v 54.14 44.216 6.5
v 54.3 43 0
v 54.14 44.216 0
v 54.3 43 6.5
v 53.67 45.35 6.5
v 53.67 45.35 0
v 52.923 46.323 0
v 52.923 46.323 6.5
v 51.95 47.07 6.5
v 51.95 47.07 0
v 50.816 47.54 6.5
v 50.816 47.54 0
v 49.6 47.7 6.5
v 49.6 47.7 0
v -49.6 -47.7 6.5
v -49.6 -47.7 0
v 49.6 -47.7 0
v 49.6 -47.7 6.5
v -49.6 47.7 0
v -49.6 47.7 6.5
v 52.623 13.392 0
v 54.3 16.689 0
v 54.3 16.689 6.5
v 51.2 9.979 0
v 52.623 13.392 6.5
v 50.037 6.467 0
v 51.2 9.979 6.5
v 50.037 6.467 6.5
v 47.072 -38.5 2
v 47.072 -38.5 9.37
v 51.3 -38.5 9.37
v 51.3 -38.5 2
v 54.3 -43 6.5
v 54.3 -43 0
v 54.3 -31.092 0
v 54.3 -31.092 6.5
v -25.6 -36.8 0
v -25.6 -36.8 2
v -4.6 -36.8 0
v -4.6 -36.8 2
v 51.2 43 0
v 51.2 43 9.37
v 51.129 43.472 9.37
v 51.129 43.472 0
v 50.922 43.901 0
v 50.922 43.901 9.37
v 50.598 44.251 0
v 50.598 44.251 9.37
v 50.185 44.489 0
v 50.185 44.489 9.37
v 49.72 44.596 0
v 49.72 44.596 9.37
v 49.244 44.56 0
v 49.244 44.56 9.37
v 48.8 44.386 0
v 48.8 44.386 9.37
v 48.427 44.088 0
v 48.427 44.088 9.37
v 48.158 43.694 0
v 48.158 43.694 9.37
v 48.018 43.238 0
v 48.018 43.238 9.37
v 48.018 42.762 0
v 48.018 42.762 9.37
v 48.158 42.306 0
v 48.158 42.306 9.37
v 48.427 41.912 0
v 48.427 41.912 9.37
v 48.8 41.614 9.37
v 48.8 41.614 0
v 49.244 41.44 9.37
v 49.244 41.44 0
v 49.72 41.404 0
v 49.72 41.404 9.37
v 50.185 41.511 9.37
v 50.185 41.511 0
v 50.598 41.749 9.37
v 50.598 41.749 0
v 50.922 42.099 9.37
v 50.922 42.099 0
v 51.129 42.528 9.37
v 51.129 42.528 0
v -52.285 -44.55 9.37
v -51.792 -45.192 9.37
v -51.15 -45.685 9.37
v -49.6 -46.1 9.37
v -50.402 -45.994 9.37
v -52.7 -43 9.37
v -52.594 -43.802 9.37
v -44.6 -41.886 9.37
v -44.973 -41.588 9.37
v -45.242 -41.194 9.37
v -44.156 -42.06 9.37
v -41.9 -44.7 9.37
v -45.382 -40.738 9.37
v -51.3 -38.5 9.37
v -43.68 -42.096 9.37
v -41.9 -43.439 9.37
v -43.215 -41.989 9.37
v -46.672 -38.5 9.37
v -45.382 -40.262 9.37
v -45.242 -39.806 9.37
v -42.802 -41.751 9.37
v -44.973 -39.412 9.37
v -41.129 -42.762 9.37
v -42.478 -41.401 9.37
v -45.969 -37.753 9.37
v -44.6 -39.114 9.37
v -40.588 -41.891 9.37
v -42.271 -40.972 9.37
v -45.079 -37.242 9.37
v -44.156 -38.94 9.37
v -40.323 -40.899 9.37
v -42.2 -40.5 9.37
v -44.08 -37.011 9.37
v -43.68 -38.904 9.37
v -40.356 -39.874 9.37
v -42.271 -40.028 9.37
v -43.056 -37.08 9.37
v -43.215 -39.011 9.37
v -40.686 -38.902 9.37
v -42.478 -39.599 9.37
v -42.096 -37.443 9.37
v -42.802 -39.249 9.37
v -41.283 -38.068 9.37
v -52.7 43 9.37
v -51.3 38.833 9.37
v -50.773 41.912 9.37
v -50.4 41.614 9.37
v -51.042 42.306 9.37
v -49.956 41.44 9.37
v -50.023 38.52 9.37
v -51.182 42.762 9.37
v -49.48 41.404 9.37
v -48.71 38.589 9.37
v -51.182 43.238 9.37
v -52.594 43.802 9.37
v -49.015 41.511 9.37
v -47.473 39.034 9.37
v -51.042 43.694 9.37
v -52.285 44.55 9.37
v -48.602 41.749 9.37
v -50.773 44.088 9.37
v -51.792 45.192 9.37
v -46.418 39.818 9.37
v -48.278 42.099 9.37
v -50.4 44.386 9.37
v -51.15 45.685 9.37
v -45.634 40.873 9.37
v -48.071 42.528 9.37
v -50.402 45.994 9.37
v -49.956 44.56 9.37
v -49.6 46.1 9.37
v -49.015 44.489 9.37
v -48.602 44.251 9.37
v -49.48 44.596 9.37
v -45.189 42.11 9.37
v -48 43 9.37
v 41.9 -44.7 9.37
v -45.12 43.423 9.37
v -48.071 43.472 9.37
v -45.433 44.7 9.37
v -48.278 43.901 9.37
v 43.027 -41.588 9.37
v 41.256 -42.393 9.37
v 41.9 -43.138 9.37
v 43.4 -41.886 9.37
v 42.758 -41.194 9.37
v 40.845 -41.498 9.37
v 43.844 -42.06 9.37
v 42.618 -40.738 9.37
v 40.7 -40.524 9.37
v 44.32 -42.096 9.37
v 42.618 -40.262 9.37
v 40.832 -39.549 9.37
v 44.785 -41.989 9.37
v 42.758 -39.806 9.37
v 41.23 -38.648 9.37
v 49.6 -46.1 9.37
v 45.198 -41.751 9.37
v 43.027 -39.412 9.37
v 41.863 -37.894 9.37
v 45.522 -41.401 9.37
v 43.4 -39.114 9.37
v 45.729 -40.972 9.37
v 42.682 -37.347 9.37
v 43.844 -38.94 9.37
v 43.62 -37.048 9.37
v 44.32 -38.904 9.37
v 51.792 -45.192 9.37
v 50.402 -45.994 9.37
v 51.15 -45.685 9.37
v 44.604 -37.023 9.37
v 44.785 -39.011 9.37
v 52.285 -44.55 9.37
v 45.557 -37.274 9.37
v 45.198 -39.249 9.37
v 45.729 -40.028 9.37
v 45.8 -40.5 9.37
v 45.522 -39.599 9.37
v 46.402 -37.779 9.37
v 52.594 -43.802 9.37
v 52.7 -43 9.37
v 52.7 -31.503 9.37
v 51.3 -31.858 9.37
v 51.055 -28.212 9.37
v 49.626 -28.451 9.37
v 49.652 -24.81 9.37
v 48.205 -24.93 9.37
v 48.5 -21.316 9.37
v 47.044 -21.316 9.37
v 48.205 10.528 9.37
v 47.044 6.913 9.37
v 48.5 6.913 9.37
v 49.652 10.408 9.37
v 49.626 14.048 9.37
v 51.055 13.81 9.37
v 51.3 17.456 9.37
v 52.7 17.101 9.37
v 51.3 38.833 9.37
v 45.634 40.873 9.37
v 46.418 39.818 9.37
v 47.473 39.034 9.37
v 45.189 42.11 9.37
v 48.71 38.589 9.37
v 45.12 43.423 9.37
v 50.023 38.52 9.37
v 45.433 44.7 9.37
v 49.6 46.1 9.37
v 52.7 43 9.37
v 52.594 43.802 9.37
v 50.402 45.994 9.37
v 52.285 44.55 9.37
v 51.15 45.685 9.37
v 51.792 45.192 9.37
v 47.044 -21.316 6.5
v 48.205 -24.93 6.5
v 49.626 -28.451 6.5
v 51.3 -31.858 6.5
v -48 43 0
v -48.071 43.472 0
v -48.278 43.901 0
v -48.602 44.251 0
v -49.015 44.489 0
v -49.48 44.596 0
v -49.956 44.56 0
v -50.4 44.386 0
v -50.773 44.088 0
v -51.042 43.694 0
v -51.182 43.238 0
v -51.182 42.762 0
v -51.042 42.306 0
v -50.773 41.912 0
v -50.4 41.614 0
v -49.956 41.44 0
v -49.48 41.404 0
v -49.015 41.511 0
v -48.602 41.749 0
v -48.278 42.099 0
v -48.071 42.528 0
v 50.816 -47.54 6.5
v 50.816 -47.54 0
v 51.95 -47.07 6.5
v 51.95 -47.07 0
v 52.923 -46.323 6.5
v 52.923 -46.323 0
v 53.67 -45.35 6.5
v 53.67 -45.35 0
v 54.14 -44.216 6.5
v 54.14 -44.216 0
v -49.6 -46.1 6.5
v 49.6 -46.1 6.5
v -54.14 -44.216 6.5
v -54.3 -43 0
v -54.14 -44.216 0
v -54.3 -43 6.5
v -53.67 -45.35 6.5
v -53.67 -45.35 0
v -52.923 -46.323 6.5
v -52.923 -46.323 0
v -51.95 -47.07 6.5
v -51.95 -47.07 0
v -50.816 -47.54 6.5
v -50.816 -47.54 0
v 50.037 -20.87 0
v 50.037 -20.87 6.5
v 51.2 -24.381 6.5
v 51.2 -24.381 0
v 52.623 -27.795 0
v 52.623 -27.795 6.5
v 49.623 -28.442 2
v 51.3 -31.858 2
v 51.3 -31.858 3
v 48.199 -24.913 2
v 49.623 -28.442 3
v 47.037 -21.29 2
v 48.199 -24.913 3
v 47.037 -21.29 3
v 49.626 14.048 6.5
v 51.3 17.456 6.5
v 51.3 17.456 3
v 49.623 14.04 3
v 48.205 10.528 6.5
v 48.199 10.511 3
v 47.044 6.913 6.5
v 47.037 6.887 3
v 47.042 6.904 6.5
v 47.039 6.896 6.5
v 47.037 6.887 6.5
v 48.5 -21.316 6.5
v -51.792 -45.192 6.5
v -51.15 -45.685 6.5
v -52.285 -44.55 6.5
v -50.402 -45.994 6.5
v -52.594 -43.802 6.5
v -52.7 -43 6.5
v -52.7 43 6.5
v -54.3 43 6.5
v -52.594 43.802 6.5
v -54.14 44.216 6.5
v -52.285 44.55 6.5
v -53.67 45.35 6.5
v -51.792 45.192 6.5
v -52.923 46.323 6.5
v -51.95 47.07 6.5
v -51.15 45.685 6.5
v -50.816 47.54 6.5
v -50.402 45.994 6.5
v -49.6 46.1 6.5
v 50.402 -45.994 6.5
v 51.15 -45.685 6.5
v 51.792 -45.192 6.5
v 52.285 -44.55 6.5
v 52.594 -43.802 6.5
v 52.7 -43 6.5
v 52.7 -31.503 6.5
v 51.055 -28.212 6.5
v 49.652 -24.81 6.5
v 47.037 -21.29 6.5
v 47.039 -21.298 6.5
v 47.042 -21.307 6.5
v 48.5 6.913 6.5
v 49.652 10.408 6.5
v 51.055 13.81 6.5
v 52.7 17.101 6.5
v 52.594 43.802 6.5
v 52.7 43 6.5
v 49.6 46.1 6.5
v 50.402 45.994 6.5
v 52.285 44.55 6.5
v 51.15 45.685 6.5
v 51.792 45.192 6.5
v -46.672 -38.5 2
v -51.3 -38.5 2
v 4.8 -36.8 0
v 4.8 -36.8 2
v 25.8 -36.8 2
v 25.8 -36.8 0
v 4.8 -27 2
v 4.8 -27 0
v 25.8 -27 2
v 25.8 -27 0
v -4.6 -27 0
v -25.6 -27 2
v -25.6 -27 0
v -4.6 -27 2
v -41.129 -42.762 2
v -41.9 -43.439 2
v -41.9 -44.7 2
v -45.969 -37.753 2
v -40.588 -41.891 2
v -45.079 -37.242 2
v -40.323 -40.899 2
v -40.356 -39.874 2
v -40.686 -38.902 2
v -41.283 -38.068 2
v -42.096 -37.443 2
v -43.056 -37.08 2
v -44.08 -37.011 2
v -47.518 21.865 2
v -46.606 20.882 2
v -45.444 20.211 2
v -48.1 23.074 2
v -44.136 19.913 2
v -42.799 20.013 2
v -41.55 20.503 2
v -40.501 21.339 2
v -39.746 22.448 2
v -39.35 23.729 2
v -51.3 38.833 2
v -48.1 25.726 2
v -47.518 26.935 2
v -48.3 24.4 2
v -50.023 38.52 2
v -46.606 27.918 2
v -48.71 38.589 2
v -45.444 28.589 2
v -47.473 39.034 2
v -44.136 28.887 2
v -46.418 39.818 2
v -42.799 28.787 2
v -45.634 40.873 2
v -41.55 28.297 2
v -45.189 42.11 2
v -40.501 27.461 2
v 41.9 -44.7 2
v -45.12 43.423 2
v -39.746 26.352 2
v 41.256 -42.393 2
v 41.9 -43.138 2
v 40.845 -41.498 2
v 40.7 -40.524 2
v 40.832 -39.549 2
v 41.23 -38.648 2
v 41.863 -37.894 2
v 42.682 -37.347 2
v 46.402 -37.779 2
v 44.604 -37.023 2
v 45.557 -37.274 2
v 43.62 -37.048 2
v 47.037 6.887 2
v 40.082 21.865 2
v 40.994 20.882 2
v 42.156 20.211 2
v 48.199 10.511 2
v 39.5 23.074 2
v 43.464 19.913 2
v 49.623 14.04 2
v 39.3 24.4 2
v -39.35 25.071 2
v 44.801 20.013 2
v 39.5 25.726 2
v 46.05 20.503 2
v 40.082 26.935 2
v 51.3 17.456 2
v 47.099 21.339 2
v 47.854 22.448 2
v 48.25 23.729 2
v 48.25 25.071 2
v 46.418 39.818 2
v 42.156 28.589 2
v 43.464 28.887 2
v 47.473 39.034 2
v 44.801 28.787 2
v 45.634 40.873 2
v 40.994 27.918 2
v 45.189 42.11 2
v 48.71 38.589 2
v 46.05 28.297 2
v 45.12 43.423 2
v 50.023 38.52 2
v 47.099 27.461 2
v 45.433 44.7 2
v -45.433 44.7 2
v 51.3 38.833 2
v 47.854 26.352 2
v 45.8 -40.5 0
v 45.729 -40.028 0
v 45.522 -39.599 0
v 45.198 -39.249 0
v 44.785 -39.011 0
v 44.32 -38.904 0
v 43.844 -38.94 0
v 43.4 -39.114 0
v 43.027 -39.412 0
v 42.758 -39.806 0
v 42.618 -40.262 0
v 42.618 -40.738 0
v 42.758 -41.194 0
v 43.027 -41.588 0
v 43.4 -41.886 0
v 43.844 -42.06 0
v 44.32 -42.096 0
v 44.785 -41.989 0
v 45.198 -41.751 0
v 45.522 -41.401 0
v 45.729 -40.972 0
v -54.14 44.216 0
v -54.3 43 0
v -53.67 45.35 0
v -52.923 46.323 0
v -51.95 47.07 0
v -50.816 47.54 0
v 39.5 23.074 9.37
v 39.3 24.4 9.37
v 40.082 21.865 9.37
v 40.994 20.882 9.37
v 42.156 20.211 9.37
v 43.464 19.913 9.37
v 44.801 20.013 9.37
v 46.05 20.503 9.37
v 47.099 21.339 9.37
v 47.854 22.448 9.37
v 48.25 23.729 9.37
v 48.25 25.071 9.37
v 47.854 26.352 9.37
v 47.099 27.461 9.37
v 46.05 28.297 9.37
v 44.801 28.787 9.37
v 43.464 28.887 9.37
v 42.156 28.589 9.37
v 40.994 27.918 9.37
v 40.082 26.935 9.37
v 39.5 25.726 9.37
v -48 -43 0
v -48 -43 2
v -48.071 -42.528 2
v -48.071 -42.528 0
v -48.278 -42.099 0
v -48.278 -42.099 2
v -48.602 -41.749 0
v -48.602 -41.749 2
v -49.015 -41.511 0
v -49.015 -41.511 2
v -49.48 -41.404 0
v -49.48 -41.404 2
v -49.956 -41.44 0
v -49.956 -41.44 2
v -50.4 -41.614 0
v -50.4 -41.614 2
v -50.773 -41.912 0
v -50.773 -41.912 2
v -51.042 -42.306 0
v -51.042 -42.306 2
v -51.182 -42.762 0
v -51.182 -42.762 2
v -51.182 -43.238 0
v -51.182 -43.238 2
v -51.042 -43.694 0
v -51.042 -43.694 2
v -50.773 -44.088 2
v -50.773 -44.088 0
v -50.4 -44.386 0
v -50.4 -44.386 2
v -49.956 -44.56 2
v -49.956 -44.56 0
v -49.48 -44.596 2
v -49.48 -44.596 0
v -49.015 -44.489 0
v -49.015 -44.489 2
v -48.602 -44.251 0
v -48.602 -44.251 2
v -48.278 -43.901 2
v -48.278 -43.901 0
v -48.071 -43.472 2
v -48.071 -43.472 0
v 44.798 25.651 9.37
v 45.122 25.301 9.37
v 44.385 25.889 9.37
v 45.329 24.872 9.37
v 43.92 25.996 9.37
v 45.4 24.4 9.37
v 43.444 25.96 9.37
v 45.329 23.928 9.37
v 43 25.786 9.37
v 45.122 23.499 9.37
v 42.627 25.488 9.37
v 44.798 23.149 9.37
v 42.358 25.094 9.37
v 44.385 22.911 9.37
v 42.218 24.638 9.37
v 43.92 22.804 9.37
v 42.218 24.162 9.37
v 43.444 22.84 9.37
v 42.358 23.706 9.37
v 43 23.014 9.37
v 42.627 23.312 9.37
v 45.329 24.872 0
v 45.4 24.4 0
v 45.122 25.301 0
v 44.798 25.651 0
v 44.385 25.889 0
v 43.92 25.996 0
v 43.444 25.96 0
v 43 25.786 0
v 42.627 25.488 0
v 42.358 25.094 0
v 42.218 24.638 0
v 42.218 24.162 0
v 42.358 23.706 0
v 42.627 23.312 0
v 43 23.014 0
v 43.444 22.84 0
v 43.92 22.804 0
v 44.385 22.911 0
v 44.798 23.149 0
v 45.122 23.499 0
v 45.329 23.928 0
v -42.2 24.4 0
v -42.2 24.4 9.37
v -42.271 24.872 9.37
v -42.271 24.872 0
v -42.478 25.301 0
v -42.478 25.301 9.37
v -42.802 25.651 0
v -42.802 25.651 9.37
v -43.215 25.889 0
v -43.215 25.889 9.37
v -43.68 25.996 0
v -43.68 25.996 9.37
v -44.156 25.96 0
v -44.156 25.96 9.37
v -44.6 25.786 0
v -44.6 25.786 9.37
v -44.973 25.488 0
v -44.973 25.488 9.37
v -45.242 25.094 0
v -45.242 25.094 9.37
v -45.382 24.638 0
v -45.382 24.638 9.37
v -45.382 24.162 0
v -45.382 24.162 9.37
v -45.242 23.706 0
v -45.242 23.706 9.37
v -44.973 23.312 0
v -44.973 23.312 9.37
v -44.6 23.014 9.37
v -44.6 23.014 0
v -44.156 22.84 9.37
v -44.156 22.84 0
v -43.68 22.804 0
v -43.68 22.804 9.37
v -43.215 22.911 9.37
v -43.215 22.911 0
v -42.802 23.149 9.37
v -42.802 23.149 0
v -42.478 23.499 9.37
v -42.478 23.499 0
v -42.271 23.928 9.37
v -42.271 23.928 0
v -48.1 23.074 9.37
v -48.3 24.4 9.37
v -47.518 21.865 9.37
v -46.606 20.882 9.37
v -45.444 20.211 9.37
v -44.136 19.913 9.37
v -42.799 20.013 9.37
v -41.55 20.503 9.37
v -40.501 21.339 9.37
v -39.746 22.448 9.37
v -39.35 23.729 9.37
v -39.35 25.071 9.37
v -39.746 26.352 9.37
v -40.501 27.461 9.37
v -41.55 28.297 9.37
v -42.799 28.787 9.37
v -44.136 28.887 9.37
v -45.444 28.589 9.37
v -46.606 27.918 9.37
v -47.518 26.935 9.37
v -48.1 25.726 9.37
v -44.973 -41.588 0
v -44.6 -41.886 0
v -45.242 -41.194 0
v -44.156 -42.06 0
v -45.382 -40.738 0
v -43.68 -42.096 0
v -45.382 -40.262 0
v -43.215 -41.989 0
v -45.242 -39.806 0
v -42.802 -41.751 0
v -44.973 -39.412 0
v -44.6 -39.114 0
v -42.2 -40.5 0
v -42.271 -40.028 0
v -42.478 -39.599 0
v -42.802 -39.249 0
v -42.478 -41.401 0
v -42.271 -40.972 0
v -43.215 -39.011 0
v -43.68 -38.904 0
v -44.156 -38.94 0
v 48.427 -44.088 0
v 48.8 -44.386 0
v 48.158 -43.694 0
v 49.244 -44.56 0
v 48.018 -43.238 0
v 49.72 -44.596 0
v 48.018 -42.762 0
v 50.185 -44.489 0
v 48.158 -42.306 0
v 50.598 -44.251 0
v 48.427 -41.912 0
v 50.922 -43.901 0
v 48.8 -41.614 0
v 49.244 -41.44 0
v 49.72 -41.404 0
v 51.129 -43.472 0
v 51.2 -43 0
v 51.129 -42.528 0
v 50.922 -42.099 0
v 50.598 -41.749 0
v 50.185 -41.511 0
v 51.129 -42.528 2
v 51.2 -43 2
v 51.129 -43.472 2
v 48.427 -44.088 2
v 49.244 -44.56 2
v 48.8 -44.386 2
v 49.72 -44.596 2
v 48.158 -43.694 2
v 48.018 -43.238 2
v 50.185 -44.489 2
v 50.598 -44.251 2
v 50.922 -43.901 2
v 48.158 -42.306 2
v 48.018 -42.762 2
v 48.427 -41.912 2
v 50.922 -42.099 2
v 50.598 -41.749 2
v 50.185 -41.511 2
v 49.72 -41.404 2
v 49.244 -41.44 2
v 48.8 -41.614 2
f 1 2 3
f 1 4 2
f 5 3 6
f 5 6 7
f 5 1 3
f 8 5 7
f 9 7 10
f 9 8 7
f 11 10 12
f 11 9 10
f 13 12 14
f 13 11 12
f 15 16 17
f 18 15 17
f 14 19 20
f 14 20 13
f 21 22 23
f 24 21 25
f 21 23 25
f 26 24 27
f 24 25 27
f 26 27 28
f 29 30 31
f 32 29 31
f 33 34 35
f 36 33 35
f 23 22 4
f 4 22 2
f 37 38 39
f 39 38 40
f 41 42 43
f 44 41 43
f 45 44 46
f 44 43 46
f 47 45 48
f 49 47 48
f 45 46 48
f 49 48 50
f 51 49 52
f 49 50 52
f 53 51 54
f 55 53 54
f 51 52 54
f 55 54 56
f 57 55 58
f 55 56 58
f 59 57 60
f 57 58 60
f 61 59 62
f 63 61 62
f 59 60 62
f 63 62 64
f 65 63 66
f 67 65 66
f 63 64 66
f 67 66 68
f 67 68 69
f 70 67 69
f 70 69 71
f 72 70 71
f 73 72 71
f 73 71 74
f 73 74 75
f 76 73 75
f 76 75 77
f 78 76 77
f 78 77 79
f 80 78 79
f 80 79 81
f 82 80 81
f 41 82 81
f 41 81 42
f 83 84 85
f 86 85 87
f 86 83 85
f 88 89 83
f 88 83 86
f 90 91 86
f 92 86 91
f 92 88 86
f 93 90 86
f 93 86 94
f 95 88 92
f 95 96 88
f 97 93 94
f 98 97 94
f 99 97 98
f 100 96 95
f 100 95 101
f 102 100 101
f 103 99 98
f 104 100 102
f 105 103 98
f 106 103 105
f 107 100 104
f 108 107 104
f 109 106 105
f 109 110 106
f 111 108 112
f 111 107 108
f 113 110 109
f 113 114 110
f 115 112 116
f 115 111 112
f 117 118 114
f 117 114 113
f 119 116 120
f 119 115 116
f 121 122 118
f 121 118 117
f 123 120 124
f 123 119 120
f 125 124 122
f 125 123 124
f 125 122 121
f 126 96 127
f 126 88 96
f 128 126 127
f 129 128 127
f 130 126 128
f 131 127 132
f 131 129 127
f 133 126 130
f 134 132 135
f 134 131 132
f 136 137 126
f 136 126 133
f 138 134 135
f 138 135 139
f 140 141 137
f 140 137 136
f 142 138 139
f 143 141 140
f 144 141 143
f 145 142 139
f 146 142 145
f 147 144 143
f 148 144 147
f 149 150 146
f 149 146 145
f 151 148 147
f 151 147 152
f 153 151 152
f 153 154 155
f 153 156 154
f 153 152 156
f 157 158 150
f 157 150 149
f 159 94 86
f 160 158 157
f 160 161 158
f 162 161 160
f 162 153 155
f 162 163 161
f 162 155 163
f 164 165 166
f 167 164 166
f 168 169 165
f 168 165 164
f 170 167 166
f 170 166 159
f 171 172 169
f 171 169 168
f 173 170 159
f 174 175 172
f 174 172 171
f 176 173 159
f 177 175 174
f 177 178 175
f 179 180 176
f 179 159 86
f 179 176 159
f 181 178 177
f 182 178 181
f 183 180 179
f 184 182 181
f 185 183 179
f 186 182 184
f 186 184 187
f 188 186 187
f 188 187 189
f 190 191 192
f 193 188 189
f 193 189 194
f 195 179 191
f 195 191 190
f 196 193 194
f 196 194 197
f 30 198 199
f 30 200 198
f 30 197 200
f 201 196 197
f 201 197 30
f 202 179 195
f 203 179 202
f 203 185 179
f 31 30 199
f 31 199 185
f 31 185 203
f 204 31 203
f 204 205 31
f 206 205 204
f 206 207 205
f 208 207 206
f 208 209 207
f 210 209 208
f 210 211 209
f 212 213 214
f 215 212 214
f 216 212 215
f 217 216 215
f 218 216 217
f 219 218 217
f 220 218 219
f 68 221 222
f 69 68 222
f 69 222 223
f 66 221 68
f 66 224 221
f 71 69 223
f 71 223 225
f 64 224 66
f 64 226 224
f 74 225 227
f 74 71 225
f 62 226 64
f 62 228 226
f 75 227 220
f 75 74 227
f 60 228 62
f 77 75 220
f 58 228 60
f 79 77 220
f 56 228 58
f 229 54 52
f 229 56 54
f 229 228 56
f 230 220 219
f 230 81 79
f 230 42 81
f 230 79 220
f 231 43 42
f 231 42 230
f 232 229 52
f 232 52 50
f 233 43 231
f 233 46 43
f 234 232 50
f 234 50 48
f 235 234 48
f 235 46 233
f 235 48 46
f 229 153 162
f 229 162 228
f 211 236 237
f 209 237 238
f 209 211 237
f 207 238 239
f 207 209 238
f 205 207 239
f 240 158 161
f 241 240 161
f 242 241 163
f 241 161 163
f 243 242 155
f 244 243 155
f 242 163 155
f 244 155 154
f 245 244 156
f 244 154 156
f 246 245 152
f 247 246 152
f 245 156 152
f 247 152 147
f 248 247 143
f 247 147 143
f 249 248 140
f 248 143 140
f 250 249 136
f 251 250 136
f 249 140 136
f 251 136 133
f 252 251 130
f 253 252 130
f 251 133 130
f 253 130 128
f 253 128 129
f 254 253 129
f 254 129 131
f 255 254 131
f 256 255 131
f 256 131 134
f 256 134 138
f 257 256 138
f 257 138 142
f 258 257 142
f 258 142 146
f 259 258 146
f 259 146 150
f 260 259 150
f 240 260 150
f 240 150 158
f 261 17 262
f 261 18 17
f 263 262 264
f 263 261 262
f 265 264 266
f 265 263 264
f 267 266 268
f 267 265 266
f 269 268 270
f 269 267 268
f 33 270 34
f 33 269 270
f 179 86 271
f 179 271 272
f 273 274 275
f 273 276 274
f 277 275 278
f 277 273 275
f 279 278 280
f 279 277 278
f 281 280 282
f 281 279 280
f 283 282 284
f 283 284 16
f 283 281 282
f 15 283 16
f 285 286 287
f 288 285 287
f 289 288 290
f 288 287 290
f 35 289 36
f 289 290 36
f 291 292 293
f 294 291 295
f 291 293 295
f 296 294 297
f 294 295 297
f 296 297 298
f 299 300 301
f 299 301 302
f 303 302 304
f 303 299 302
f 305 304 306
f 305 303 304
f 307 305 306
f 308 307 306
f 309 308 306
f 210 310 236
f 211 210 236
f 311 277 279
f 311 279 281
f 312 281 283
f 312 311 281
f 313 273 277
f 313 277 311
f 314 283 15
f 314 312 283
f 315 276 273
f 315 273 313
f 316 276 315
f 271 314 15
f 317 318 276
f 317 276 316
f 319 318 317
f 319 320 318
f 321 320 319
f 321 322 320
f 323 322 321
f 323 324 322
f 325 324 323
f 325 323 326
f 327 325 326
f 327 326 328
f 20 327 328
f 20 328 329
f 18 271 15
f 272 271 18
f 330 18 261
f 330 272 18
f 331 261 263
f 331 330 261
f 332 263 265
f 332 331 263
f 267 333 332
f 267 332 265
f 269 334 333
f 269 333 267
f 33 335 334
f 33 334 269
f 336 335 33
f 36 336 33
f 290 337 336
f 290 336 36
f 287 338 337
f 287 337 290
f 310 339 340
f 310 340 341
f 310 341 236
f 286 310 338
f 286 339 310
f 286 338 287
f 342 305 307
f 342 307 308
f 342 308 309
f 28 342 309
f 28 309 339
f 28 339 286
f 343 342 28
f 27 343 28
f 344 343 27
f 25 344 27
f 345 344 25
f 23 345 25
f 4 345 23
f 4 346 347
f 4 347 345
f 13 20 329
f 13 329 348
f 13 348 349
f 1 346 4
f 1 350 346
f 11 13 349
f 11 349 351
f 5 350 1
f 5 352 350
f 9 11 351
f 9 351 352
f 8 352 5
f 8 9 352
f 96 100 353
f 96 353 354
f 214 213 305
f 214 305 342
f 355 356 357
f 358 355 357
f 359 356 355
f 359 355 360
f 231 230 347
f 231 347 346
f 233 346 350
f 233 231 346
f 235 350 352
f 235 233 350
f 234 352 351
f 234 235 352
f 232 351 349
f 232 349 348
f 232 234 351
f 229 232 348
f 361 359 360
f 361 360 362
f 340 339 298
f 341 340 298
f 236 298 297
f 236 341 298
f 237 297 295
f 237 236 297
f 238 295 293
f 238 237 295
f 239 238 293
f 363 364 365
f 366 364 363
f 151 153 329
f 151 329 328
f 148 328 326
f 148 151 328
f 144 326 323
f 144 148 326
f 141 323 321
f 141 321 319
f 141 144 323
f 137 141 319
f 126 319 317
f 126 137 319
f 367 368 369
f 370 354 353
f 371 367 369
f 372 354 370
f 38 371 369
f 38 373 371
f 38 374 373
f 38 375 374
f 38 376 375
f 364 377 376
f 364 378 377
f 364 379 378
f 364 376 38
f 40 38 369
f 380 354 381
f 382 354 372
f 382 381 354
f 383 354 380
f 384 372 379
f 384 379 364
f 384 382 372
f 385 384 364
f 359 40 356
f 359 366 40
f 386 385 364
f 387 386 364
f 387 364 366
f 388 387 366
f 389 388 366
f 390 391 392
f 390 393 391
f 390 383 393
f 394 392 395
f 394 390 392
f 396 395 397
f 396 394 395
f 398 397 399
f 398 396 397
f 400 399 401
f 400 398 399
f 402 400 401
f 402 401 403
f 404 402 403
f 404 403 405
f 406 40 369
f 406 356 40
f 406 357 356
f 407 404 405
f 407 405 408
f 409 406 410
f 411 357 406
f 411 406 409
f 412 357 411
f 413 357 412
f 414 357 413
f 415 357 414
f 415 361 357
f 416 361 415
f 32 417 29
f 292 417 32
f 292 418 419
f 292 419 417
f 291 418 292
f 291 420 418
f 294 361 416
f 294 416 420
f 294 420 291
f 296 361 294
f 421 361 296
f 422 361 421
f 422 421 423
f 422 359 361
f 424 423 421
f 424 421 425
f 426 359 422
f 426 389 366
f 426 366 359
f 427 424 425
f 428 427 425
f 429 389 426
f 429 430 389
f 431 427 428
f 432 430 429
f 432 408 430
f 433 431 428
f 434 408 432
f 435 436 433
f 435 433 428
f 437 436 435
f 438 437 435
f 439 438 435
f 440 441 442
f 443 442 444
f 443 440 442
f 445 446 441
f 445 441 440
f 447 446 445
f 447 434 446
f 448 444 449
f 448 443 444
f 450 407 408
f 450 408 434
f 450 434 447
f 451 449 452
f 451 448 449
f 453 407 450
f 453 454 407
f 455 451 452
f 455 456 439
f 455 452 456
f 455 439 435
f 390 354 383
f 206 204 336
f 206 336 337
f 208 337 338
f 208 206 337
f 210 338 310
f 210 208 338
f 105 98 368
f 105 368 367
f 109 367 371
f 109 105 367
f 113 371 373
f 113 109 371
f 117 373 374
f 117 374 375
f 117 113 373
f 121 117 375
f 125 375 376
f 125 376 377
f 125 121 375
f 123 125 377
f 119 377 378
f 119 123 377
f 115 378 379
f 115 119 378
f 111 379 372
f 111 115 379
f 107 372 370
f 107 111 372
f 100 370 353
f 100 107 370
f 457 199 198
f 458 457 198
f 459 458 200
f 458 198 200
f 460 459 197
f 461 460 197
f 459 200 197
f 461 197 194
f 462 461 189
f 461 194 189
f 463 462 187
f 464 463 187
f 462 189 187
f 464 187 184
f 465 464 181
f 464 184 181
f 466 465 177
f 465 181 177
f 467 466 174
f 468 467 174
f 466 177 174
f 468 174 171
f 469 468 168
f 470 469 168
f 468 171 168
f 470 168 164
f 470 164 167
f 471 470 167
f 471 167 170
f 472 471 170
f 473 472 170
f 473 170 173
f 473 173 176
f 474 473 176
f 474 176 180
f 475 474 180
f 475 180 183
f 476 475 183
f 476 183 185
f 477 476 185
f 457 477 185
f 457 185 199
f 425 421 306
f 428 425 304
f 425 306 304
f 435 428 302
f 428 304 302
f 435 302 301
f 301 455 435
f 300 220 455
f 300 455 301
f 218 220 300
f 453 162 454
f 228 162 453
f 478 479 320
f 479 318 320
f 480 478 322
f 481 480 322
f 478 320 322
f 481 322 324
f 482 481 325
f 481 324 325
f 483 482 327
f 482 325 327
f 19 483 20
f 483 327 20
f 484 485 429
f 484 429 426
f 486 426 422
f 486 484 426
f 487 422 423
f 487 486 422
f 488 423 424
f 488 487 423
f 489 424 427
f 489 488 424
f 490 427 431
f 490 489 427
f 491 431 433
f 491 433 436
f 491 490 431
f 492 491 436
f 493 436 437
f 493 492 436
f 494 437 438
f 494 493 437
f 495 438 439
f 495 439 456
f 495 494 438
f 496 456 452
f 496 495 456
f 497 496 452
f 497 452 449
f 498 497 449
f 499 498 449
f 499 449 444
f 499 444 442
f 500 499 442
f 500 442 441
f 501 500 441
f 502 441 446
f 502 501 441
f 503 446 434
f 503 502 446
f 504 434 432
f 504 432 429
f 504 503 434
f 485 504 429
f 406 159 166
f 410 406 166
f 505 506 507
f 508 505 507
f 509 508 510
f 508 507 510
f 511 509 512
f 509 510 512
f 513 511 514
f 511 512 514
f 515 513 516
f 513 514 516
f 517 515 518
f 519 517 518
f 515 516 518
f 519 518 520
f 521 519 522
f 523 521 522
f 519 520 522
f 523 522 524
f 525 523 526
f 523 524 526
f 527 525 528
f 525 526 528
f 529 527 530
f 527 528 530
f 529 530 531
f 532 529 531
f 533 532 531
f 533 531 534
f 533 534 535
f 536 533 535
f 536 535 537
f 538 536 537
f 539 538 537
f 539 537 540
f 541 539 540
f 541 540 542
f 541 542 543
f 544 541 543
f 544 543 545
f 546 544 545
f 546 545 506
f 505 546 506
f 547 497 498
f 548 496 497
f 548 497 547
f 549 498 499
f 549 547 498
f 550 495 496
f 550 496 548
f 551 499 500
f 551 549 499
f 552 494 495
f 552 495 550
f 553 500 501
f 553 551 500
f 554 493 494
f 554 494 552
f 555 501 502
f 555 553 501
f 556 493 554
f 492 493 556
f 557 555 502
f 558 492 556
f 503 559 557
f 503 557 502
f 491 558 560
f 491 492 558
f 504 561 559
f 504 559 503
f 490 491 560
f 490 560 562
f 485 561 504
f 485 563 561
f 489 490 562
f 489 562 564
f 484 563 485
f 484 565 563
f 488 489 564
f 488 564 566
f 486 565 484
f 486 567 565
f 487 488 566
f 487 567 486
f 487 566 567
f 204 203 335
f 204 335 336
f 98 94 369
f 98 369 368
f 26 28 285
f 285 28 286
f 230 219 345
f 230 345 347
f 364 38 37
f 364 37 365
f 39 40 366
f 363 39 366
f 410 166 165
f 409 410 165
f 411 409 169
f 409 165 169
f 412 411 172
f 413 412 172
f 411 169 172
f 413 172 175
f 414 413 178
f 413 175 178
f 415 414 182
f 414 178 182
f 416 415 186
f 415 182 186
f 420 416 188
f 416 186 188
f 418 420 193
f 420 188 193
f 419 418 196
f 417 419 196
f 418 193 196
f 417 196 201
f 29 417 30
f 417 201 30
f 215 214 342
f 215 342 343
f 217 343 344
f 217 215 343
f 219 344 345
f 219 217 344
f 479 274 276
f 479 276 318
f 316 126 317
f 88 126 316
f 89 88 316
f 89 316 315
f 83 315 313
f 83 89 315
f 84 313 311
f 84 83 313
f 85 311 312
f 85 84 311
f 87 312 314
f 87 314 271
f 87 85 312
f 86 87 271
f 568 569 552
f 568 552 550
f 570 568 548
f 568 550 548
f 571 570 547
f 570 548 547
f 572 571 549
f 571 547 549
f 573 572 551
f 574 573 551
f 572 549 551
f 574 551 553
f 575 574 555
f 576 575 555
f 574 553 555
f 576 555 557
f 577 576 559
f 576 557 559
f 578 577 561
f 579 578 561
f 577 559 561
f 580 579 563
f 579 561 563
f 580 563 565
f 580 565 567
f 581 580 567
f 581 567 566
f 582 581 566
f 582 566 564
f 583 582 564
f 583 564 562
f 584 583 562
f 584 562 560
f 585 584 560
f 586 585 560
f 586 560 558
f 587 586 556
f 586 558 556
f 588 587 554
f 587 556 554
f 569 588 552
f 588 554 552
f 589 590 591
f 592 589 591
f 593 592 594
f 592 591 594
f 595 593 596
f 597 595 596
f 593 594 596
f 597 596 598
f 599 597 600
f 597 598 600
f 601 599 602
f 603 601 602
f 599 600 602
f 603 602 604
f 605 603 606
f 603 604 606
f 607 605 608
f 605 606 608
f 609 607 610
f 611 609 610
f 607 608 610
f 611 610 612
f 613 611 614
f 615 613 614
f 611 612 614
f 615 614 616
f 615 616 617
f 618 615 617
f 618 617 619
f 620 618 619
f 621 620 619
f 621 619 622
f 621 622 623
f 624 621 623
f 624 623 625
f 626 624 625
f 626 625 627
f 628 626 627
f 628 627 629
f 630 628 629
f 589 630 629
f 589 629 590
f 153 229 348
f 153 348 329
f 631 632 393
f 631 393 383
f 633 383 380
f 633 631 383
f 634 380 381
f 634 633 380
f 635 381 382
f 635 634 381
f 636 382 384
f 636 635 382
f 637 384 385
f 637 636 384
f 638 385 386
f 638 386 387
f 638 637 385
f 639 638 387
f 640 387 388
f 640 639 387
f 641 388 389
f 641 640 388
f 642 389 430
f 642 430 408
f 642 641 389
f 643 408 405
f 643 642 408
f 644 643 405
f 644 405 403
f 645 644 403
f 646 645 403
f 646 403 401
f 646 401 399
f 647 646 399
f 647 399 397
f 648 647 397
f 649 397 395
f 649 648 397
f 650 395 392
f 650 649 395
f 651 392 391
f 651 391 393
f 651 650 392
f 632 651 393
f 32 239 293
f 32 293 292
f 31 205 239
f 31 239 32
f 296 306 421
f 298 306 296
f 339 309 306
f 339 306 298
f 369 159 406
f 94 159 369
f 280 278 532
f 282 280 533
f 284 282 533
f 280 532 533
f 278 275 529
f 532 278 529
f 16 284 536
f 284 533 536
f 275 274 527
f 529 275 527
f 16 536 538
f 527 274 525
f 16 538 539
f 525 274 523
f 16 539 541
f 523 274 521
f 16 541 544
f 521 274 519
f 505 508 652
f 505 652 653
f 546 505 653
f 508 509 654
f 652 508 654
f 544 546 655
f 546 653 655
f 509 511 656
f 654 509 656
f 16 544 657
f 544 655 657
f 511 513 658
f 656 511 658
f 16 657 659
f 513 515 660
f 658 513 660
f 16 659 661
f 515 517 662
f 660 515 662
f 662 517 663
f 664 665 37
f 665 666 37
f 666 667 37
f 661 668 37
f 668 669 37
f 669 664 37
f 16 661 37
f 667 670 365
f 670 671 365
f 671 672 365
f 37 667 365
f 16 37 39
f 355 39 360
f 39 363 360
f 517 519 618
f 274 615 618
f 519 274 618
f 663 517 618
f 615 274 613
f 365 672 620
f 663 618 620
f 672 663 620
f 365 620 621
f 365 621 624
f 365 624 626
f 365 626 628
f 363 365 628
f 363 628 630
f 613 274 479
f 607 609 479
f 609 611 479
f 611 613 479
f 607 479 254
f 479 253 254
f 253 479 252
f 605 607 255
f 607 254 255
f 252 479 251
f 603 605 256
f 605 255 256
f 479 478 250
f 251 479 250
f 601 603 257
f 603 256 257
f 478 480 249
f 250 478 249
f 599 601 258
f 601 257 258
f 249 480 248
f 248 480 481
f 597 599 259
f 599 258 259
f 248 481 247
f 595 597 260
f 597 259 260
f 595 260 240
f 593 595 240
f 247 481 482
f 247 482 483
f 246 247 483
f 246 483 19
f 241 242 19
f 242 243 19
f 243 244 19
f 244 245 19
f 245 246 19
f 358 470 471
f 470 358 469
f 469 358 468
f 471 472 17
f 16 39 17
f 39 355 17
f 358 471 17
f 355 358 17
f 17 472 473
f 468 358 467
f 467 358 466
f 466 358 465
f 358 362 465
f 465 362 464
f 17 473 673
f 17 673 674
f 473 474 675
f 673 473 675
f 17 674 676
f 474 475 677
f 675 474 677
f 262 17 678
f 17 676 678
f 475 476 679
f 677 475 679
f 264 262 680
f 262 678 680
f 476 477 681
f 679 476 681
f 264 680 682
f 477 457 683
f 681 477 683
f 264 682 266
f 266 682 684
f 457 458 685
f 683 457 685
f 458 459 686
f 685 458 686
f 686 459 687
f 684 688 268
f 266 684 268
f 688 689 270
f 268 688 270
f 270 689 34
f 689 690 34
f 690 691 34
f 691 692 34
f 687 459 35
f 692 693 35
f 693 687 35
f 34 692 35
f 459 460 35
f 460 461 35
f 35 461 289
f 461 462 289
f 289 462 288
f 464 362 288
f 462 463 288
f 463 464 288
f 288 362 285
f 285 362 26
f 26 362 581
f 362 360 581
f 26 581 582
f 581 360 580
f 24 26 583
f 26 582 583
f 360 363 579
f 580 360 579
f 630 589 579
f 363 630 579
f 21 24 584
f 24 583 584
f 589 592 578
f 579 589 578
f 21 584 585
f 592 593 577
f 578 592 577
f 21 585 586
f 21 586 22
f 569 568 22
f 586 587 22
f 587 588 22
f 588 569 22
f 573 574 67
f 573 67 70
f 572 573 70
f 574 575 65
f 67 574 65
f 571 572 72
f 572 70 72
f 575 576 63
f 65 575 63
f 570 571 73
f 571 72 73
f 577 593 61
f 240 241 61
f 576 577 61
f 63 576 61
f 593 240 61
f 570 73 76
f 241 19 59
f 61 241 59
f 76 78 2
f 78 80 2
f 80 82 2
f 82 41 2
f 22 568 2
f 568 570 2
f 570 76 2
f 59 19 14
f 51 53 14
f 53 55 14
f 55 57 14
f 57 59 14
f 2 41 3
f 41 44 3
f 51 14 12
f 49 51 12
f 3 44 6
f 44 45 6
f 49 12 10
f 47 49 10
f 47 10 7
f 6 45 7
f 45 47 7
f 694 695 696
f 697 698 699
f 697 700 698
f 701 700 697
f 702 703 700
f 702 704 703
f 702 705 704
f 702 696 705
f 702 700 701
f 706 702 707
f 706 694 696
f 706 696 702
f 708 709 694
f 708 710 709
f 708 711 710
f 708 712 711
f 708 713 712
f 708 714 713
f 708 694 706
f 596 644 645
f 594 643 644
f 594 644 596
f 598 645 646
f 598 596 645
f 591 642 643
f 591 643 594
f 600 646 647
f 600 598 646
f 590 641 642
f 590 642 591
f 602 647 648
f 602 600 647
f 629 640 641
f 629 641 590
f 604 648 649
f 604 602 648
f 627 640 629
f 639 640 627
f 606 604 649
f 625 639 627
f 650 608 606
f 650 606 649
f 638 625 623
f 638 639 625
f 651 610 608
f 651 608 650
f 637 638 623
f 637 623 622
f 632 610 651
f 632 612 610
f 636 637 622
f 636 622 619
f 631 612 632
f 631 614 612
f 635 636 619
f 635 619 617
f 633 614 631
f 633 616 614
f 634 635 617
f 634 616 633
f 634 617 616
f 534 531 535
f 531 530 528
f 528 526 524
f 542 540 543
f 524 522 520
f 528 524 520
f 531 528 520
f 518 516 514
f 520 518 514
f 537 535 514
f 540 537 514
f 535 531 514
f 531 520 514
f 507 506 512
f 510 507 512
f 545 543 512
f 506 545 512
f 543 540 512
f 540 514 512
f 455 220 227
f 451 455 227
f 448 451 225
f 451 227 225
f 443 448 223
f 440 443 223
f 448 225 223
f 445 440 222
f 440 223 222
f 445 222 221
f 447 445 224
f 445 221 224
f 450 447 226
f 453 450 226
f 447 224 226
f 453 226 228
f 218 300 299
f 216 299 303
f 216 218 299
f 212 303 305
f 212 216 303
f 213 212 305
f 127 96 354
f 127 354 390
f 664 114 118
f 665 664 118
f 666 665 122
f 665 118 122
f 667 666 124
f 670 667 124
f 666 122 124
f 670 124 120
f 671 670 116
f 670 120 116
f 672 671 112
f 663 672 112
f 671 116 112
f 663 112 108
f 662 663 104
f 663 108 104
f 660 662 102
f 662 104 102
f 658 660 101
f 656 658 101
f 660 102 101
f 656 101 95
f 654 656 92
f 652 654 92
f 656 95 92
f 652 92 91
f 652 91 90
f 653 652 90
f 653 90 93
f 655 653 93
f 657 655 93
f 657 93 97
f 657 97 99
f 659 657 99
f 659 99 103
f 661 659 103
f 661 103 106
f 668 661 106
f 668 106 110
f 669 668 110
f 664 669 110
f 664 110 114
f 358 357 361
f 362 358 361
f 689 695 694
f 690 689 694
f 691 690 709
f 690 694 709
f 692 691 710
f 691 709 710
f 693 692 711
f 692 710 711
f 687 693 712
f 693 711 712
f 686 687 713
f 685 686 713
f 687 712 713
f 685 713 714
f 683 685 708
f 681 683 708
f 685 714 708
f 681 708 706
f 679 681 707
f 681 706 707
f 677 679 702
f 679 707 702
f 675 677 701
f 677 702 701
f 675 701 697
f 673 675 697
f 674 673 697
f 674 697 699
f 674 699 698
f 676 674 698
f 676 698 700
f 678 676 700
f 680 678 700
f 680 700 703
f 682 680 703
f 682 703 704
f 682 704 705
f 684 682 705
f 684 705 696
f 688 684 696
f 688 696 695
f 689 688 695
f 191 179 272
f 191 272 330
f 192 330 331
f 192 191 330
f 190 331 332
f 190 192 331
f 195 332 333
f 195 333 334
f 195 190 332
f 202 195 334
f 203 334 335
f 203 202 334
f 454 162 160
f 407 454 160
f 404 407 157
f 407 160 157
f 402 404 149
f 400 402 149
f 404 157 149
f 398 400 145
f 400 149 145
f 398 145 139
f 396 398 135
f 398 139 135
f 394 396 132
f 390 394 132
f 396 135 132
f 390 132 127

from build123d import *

# Parameters (mm, degrees)
SKETCH1_W                = 108.6
SKETCH1_H                = 95.4
BOSS_EXTRUDE1_DEPTH      = 6.5
FILLET1_R                = 4.7
CUT_EXTRUDE2_DEPTH       = 73.567416931
SHELL1_T                 = -3
SHELL1_THICKNESS_2_DEPTH = 1
SKETCH3_W                = 21
SKETCH3_H                = 9.8
CUT_EXTRUDE1_DEPTH       = 73.567416931
BOSS_EXTRUDE2_START      = 2.87
BOSS_EXTRUDE2_DEPTH      = 2.87
SKETCH6_R                = 1.6
CUT_EXTRUDE3_DEPTH       = 73.650512042
BOSS_EXTRUDE3_START      = 7.37
SKETCH7_R                = 4.5
SKETCH7_R_2              = 1.6
BOSS_EXTRUDE3_DEPTH      = 7.37


with BuildPart() as part:
    # Sketch1 → Boss-Extrude1 (new body)
    with BuildSketch(Plane.XY):
        Rectangle(SKETCH1_W, SKETCH1_H)
    extrude(amount=BOSS_EXTRUDE1_DEPTH)

    # Fillet1
    fillet1_edges = [part.edges().sort_by_distance(p)[0] for p in [
        (54.3, -47.7, 3.25),
        (-54.3, -47.7, 3.25),
        (-54.3, 47.7, 3.25),
        (54.3, 47.7, 3.25),
    ]]
    fillet(fillet1_edges, radius=FILLET1_R)

    # Sketch4 → Cut-Extrude2 (cut, through all)
    with BuildSketch(Plane.XY.offset(6.5)):
        with BuildLine():
            Line((50.037, 6.46747704), (50.037, -20.87017704))
            ThreePointArc((50.037, -20.87017704), (146.29602, -7.20135), (50.037, 6.46747704))
        make_face()
    extrude(amount=-CUT_EXTRUDE2_DEPTH, mode=Mode.SUBTRACT)

    # Shell1
    shell1_openings = [part.faces().sort_by_distance(p)[0] for p in [
        (-0.847501067, 0.116576538, 6.5),
    ]]
    offset(amount=SHELL1_T, openings=shell1_openings, kind=Kind.INTERSECTION)

    # Shell1 thickness 2 face (on inner face of the shell) → Shell1 thickness 2 (cut)
    with BuildSketch(Plane(origin=(-0.931808726, 0.135963236, 3), x_dir=(-1, 0, 0), z_dir=(0, 0, -1))):
        with BuildLine():
            ThreePointArc((50.368191274, -43.135963236), (49.870272802, -44.338044764), (48.668191274, -44.835963236))
            Line((48.668191274, -44.835963236), (-50.531808726, -44.835963236))
            ThreePointArc((-50.531808726, -44.835963236), (-51.733890254, -44.338044764), (-52.231808726, -43.135963236))
            Line((-52.231808726, -43.135963236), (-52.231808726, -31.994266579))
            ThreePointArc((-52.231808726, -31.994266579), (-49.810478696, -26.826892146), (-47.968808726, -21.425702521))
            Line((-47.968808726, -21.425702521), (-47.968808726, 6.751076049))
            ThreePointArc((-47.968808726, 6.751076049), (-49.810478696, 12.152265674), (-52.231808726, 17.319640107))
            Line((-52.231808726, 17.319640107), (-52.231808726, 42.864036764))
            ThreePointArc((-52.231808726, 42.864036764), (-51.733890254, 44.066118292), (-50.531808726, 44.564036764))
            Line((-50.531808726, 44.564036764), (48.668191274, 44.564036764))
            ThreePointArc((48.668191274, 44.564036764), (49.870272802, 44.066118292), (50.368191274, 42.864036764))
            Line((50.368191274, 42.864036764), (50.368191274, -43.135963236))
        make_face()
    extrude(amount=SHELL1_THICKNESS_2_DEPTH, mode=Mode.SUBTRACT)

    # Sketch3 → Cut-Extrude1 (cut, through all)
    with BuildSketch(Plane.XY.offset(6.5)):
        with Locations((-15.1, -31.9)):
            Rectangle(SKETCH3_W, SKETCH3_H)
        with Locations((15.3, -31.9)):
            Rectangle(SKETCH3_W, SKETCH3_H)
    extrude(amount=-CUT_EXTRUDE1_DEPTH, mode=Mode.SUBTRACT)

    # Sketch5 → Boss-Extrude2 (add)
    with BuildSketch(Plane.XY.offset(6.5).offset(BOSS_EXTRUDE2_START)):
        with BuildLine():
            Line((52.7, 17.100794024), (52.7, 43))
            ThreePointArc((52.7, 43), (51.792031022, 45.192031022), (49.6, 46.1))
            Line((49.6, 46.1), (-49.6, 46.1))
            ThreePointArc((-49.6, 46.1), (-51.792031022, 45.192031022), (-52.7, 43))
            Line((-52.7, 43), (-52.7, -43))
            ThreePointArc((-52.7, -43), (-51.792031022, -45.192031022), (-49.6, -46.1))
            Line((-49.6, -46.1), (49.6, -46.1))
            ThreePointArc((49.6, -46.1), (51.792031022, -45.192031022), (52.7, -43))
            Line((52.7, -43), (52.7, -31.503494024))
            ThreePointArc((52.7, -31.503494024), (50.322512039, -26.523985726), (48.500249857, -21.315597065))
            Line((48.500249857, -21.315597065), (47.044269983, -21.315597065))
            ThreePointArc((47.044269983, -21.315597065), (48.883695535, -26.70338335), (51.3, -31.858303343))
            Line((51.3, -31.858303343), (51.3, -43))
            ThreePointArc((51.3, -43), (50.802081528, -44.202081528), (49.6, -44.7))
            Line((49.6, -44.7), (-49.6, -44.7))
            ThreePointArc((-49.6, -44.7), (-50.802081528, -44.202081528), (-51.3, -43))
            Line((-51.3, -43), (-51.3, 43))
            ThreePointArc((-51.3, 43), (-50.802081528, 44.202081528), (-49.6, 44.7))
            Line((-49.6, 44.7), (49.6, 44.7))
            ThreePointArc((49.6, 44.7), (50.802081528, 44.202081528), (51.3, 43))
            Line((51.3, 43), (51.3, 17.455603343))
            ThreePointArc((51.3, 17.455603343), (48.883695535, 12.30068335), (47.044269983, 6.912897065))
            Line((47.044269983, 6.912897065), (48.500249857, 6.912897065))
            ThreePointArc((48.500249857, 6.912897065), (50.322512039, 12.121285726), (52.7, 17.100794024))
        make_face()
    extrude(amount=-BOSS_EXTRUDE2_DEPTH)

    # Sketch6 → Cut-Extrude3 (cut, through all)
    with BuildSketch(Plane.XY.offset(2)):
        with Locations((-49.6, 43)):
            Circle(SKETCH6_R)
        with Locations((-43.8, 24.4)):
            Circle(SKETCH6_R)
        with Locations((43.8, 24.4)):
            Circle(SKETCH6_R)
        with Locations((49.6, 43)):
            Circle(SKETCH6_R)
        with Locations((49.6, -43)):
            Circle(SKETCH6_R)
        with Locations((44.2, -40.5)):
            Circle(SKETCH6_R)
        with Locations((-49.6, -43)):
            Circle(SKETCH6_R)
        with Locations((-43.8, -40.5)):
            Circle(SKETCH6_R)
    extrude(amount=-CUT_EXTRUDE3_DEPTH, mode=Mode.SUBTRACT)

    # Sketch7 → Boss-Extrude3 (add)
    # profile 1 of 6: a face of its own
    with BuildSketch(Plane.XY.offset(2).offset(BOSS_EXTRUDE3_START)):
        with Locations(Location((-43.8, 24.4, 0), (0, 0, 180))):
            Circle(SKETCH7_R)
        with Locations((-43.8, 24.4)):
            Circle(SKETCH7_R_2, mode=Mode.SUBTRACT)
    # profile 2 of 6: a face of its own
    with BuildSketch(Plane.XY.offset(2).offset(BOSS_EXTRUDE3_START)):
        with Locations(Location((43.8, 24.4, 0), (0, 0, 180))):
            Circle(SKETCH7_R)
        with Locations((43.8, 24.4)):
            Circle(SKETCH7_R_2, mode=Mode.SUBTRACT)
    # profile 3 of 6: a face of its own
    with BuildSketch(Plane.XY.offset(2).offset(BOSS_EXTRUDE3_START)):
        with BuildLine():
            Line((47.072281323, -38.5), (51.3, -38.5))
            Line((51.3, -38.5), (51.3, -43))
            ThreePointArc((51.3, -43), (50.802081528, -44.202081528), (49.6, -44.7))
            Line((49.6, -44.7), (41.9, -44.7))
            Line((41.9, -44.7), (41.9, -43.138181192))
            ThreePointArc((41.9, -43.138181192), (41.863323371, -37.894248222), (47.072281323, -38.5))
        make_face()
        with Locations((44.2, -40.5)):
            Circle(SKETCH7_R_2, mode=Mode.SUBTRACT)
    # profile 4 of 6: a face of its own
    with BuildSketch(Plane.XY.offset(2).offset(BOSS_EXTRUDE3_START)):
        with BuildLine():
            Line((-49.6, -44.7), (-41.9, -44.7))
            Line((-41.9, -44.7), (-41.9, -43.439387691))
            ThreePointArc((-41.9, -43.439387691), (-41.282914297, -38.068070814), (-46.672281323, -38.5))
            Line((-46.672281323, -38.5), (-51.3, -38.5))
            Line((-51.3, -38.5), (-51.3, -43))
            ThreePointArc((-51.3, -43), (-50.802081528, -44.202081528), (-49.6, -44.7))
        make_face()
        with Locations((-43.8, -40.5)):
            Circle(SKETCH7_R_2, mode=Mode.SUBTRACT)
    # profile 5 of 6: a face of its own
    with BuildSketch(Plane.XY.offset(2).offset(BOSS_EXTRUDE3_START)):
        with BuildLine():
            Line((-49.6, 44.7), (-45.433466669, 44.7))
            ThreePointArc((-45.433466669, 44.7), (-46.418019485, 39.818019485), (-51.3, 38.833466669))
            Line((-51.3, 38.833466669), (-51.3, 43))
            ThreePointArc((-51.3, 43), (-50.802081528, 44.202081528), (-49.6, 44.7))
        make_face()
        with Locations((-49.6, 43)):
            Circle(SKETCH7_R_2, mode=Mode.SUBTRACT)
    # profile 6 of 6: a face of its own
    with BuildSketch(Plane.XY.offset(2).offset(BOSS_EXTRUDE3_START)):
        with BuildLine():
            Line((45.433466669, 44.7), (49.6, 44.7))
            ThreePointArc((49.6, 44.7), (50.802081528, 44.202081528), (51.3, 43))
            Line((51.3, 43), (51.3, 38.833466669))
            ThreePointArc((51.3, 38.833466669), (46.418019485, 39.818019485), (45.433466669, 44.7))
        make_face()
        with Locations((49.6, 43)):
            Circle(SKETCH7_R_2, mode=Mode.SUBTRACT)
    extrude(amount=-BOSS_EXTRUDE3_DEPTH)


solid = part.part
